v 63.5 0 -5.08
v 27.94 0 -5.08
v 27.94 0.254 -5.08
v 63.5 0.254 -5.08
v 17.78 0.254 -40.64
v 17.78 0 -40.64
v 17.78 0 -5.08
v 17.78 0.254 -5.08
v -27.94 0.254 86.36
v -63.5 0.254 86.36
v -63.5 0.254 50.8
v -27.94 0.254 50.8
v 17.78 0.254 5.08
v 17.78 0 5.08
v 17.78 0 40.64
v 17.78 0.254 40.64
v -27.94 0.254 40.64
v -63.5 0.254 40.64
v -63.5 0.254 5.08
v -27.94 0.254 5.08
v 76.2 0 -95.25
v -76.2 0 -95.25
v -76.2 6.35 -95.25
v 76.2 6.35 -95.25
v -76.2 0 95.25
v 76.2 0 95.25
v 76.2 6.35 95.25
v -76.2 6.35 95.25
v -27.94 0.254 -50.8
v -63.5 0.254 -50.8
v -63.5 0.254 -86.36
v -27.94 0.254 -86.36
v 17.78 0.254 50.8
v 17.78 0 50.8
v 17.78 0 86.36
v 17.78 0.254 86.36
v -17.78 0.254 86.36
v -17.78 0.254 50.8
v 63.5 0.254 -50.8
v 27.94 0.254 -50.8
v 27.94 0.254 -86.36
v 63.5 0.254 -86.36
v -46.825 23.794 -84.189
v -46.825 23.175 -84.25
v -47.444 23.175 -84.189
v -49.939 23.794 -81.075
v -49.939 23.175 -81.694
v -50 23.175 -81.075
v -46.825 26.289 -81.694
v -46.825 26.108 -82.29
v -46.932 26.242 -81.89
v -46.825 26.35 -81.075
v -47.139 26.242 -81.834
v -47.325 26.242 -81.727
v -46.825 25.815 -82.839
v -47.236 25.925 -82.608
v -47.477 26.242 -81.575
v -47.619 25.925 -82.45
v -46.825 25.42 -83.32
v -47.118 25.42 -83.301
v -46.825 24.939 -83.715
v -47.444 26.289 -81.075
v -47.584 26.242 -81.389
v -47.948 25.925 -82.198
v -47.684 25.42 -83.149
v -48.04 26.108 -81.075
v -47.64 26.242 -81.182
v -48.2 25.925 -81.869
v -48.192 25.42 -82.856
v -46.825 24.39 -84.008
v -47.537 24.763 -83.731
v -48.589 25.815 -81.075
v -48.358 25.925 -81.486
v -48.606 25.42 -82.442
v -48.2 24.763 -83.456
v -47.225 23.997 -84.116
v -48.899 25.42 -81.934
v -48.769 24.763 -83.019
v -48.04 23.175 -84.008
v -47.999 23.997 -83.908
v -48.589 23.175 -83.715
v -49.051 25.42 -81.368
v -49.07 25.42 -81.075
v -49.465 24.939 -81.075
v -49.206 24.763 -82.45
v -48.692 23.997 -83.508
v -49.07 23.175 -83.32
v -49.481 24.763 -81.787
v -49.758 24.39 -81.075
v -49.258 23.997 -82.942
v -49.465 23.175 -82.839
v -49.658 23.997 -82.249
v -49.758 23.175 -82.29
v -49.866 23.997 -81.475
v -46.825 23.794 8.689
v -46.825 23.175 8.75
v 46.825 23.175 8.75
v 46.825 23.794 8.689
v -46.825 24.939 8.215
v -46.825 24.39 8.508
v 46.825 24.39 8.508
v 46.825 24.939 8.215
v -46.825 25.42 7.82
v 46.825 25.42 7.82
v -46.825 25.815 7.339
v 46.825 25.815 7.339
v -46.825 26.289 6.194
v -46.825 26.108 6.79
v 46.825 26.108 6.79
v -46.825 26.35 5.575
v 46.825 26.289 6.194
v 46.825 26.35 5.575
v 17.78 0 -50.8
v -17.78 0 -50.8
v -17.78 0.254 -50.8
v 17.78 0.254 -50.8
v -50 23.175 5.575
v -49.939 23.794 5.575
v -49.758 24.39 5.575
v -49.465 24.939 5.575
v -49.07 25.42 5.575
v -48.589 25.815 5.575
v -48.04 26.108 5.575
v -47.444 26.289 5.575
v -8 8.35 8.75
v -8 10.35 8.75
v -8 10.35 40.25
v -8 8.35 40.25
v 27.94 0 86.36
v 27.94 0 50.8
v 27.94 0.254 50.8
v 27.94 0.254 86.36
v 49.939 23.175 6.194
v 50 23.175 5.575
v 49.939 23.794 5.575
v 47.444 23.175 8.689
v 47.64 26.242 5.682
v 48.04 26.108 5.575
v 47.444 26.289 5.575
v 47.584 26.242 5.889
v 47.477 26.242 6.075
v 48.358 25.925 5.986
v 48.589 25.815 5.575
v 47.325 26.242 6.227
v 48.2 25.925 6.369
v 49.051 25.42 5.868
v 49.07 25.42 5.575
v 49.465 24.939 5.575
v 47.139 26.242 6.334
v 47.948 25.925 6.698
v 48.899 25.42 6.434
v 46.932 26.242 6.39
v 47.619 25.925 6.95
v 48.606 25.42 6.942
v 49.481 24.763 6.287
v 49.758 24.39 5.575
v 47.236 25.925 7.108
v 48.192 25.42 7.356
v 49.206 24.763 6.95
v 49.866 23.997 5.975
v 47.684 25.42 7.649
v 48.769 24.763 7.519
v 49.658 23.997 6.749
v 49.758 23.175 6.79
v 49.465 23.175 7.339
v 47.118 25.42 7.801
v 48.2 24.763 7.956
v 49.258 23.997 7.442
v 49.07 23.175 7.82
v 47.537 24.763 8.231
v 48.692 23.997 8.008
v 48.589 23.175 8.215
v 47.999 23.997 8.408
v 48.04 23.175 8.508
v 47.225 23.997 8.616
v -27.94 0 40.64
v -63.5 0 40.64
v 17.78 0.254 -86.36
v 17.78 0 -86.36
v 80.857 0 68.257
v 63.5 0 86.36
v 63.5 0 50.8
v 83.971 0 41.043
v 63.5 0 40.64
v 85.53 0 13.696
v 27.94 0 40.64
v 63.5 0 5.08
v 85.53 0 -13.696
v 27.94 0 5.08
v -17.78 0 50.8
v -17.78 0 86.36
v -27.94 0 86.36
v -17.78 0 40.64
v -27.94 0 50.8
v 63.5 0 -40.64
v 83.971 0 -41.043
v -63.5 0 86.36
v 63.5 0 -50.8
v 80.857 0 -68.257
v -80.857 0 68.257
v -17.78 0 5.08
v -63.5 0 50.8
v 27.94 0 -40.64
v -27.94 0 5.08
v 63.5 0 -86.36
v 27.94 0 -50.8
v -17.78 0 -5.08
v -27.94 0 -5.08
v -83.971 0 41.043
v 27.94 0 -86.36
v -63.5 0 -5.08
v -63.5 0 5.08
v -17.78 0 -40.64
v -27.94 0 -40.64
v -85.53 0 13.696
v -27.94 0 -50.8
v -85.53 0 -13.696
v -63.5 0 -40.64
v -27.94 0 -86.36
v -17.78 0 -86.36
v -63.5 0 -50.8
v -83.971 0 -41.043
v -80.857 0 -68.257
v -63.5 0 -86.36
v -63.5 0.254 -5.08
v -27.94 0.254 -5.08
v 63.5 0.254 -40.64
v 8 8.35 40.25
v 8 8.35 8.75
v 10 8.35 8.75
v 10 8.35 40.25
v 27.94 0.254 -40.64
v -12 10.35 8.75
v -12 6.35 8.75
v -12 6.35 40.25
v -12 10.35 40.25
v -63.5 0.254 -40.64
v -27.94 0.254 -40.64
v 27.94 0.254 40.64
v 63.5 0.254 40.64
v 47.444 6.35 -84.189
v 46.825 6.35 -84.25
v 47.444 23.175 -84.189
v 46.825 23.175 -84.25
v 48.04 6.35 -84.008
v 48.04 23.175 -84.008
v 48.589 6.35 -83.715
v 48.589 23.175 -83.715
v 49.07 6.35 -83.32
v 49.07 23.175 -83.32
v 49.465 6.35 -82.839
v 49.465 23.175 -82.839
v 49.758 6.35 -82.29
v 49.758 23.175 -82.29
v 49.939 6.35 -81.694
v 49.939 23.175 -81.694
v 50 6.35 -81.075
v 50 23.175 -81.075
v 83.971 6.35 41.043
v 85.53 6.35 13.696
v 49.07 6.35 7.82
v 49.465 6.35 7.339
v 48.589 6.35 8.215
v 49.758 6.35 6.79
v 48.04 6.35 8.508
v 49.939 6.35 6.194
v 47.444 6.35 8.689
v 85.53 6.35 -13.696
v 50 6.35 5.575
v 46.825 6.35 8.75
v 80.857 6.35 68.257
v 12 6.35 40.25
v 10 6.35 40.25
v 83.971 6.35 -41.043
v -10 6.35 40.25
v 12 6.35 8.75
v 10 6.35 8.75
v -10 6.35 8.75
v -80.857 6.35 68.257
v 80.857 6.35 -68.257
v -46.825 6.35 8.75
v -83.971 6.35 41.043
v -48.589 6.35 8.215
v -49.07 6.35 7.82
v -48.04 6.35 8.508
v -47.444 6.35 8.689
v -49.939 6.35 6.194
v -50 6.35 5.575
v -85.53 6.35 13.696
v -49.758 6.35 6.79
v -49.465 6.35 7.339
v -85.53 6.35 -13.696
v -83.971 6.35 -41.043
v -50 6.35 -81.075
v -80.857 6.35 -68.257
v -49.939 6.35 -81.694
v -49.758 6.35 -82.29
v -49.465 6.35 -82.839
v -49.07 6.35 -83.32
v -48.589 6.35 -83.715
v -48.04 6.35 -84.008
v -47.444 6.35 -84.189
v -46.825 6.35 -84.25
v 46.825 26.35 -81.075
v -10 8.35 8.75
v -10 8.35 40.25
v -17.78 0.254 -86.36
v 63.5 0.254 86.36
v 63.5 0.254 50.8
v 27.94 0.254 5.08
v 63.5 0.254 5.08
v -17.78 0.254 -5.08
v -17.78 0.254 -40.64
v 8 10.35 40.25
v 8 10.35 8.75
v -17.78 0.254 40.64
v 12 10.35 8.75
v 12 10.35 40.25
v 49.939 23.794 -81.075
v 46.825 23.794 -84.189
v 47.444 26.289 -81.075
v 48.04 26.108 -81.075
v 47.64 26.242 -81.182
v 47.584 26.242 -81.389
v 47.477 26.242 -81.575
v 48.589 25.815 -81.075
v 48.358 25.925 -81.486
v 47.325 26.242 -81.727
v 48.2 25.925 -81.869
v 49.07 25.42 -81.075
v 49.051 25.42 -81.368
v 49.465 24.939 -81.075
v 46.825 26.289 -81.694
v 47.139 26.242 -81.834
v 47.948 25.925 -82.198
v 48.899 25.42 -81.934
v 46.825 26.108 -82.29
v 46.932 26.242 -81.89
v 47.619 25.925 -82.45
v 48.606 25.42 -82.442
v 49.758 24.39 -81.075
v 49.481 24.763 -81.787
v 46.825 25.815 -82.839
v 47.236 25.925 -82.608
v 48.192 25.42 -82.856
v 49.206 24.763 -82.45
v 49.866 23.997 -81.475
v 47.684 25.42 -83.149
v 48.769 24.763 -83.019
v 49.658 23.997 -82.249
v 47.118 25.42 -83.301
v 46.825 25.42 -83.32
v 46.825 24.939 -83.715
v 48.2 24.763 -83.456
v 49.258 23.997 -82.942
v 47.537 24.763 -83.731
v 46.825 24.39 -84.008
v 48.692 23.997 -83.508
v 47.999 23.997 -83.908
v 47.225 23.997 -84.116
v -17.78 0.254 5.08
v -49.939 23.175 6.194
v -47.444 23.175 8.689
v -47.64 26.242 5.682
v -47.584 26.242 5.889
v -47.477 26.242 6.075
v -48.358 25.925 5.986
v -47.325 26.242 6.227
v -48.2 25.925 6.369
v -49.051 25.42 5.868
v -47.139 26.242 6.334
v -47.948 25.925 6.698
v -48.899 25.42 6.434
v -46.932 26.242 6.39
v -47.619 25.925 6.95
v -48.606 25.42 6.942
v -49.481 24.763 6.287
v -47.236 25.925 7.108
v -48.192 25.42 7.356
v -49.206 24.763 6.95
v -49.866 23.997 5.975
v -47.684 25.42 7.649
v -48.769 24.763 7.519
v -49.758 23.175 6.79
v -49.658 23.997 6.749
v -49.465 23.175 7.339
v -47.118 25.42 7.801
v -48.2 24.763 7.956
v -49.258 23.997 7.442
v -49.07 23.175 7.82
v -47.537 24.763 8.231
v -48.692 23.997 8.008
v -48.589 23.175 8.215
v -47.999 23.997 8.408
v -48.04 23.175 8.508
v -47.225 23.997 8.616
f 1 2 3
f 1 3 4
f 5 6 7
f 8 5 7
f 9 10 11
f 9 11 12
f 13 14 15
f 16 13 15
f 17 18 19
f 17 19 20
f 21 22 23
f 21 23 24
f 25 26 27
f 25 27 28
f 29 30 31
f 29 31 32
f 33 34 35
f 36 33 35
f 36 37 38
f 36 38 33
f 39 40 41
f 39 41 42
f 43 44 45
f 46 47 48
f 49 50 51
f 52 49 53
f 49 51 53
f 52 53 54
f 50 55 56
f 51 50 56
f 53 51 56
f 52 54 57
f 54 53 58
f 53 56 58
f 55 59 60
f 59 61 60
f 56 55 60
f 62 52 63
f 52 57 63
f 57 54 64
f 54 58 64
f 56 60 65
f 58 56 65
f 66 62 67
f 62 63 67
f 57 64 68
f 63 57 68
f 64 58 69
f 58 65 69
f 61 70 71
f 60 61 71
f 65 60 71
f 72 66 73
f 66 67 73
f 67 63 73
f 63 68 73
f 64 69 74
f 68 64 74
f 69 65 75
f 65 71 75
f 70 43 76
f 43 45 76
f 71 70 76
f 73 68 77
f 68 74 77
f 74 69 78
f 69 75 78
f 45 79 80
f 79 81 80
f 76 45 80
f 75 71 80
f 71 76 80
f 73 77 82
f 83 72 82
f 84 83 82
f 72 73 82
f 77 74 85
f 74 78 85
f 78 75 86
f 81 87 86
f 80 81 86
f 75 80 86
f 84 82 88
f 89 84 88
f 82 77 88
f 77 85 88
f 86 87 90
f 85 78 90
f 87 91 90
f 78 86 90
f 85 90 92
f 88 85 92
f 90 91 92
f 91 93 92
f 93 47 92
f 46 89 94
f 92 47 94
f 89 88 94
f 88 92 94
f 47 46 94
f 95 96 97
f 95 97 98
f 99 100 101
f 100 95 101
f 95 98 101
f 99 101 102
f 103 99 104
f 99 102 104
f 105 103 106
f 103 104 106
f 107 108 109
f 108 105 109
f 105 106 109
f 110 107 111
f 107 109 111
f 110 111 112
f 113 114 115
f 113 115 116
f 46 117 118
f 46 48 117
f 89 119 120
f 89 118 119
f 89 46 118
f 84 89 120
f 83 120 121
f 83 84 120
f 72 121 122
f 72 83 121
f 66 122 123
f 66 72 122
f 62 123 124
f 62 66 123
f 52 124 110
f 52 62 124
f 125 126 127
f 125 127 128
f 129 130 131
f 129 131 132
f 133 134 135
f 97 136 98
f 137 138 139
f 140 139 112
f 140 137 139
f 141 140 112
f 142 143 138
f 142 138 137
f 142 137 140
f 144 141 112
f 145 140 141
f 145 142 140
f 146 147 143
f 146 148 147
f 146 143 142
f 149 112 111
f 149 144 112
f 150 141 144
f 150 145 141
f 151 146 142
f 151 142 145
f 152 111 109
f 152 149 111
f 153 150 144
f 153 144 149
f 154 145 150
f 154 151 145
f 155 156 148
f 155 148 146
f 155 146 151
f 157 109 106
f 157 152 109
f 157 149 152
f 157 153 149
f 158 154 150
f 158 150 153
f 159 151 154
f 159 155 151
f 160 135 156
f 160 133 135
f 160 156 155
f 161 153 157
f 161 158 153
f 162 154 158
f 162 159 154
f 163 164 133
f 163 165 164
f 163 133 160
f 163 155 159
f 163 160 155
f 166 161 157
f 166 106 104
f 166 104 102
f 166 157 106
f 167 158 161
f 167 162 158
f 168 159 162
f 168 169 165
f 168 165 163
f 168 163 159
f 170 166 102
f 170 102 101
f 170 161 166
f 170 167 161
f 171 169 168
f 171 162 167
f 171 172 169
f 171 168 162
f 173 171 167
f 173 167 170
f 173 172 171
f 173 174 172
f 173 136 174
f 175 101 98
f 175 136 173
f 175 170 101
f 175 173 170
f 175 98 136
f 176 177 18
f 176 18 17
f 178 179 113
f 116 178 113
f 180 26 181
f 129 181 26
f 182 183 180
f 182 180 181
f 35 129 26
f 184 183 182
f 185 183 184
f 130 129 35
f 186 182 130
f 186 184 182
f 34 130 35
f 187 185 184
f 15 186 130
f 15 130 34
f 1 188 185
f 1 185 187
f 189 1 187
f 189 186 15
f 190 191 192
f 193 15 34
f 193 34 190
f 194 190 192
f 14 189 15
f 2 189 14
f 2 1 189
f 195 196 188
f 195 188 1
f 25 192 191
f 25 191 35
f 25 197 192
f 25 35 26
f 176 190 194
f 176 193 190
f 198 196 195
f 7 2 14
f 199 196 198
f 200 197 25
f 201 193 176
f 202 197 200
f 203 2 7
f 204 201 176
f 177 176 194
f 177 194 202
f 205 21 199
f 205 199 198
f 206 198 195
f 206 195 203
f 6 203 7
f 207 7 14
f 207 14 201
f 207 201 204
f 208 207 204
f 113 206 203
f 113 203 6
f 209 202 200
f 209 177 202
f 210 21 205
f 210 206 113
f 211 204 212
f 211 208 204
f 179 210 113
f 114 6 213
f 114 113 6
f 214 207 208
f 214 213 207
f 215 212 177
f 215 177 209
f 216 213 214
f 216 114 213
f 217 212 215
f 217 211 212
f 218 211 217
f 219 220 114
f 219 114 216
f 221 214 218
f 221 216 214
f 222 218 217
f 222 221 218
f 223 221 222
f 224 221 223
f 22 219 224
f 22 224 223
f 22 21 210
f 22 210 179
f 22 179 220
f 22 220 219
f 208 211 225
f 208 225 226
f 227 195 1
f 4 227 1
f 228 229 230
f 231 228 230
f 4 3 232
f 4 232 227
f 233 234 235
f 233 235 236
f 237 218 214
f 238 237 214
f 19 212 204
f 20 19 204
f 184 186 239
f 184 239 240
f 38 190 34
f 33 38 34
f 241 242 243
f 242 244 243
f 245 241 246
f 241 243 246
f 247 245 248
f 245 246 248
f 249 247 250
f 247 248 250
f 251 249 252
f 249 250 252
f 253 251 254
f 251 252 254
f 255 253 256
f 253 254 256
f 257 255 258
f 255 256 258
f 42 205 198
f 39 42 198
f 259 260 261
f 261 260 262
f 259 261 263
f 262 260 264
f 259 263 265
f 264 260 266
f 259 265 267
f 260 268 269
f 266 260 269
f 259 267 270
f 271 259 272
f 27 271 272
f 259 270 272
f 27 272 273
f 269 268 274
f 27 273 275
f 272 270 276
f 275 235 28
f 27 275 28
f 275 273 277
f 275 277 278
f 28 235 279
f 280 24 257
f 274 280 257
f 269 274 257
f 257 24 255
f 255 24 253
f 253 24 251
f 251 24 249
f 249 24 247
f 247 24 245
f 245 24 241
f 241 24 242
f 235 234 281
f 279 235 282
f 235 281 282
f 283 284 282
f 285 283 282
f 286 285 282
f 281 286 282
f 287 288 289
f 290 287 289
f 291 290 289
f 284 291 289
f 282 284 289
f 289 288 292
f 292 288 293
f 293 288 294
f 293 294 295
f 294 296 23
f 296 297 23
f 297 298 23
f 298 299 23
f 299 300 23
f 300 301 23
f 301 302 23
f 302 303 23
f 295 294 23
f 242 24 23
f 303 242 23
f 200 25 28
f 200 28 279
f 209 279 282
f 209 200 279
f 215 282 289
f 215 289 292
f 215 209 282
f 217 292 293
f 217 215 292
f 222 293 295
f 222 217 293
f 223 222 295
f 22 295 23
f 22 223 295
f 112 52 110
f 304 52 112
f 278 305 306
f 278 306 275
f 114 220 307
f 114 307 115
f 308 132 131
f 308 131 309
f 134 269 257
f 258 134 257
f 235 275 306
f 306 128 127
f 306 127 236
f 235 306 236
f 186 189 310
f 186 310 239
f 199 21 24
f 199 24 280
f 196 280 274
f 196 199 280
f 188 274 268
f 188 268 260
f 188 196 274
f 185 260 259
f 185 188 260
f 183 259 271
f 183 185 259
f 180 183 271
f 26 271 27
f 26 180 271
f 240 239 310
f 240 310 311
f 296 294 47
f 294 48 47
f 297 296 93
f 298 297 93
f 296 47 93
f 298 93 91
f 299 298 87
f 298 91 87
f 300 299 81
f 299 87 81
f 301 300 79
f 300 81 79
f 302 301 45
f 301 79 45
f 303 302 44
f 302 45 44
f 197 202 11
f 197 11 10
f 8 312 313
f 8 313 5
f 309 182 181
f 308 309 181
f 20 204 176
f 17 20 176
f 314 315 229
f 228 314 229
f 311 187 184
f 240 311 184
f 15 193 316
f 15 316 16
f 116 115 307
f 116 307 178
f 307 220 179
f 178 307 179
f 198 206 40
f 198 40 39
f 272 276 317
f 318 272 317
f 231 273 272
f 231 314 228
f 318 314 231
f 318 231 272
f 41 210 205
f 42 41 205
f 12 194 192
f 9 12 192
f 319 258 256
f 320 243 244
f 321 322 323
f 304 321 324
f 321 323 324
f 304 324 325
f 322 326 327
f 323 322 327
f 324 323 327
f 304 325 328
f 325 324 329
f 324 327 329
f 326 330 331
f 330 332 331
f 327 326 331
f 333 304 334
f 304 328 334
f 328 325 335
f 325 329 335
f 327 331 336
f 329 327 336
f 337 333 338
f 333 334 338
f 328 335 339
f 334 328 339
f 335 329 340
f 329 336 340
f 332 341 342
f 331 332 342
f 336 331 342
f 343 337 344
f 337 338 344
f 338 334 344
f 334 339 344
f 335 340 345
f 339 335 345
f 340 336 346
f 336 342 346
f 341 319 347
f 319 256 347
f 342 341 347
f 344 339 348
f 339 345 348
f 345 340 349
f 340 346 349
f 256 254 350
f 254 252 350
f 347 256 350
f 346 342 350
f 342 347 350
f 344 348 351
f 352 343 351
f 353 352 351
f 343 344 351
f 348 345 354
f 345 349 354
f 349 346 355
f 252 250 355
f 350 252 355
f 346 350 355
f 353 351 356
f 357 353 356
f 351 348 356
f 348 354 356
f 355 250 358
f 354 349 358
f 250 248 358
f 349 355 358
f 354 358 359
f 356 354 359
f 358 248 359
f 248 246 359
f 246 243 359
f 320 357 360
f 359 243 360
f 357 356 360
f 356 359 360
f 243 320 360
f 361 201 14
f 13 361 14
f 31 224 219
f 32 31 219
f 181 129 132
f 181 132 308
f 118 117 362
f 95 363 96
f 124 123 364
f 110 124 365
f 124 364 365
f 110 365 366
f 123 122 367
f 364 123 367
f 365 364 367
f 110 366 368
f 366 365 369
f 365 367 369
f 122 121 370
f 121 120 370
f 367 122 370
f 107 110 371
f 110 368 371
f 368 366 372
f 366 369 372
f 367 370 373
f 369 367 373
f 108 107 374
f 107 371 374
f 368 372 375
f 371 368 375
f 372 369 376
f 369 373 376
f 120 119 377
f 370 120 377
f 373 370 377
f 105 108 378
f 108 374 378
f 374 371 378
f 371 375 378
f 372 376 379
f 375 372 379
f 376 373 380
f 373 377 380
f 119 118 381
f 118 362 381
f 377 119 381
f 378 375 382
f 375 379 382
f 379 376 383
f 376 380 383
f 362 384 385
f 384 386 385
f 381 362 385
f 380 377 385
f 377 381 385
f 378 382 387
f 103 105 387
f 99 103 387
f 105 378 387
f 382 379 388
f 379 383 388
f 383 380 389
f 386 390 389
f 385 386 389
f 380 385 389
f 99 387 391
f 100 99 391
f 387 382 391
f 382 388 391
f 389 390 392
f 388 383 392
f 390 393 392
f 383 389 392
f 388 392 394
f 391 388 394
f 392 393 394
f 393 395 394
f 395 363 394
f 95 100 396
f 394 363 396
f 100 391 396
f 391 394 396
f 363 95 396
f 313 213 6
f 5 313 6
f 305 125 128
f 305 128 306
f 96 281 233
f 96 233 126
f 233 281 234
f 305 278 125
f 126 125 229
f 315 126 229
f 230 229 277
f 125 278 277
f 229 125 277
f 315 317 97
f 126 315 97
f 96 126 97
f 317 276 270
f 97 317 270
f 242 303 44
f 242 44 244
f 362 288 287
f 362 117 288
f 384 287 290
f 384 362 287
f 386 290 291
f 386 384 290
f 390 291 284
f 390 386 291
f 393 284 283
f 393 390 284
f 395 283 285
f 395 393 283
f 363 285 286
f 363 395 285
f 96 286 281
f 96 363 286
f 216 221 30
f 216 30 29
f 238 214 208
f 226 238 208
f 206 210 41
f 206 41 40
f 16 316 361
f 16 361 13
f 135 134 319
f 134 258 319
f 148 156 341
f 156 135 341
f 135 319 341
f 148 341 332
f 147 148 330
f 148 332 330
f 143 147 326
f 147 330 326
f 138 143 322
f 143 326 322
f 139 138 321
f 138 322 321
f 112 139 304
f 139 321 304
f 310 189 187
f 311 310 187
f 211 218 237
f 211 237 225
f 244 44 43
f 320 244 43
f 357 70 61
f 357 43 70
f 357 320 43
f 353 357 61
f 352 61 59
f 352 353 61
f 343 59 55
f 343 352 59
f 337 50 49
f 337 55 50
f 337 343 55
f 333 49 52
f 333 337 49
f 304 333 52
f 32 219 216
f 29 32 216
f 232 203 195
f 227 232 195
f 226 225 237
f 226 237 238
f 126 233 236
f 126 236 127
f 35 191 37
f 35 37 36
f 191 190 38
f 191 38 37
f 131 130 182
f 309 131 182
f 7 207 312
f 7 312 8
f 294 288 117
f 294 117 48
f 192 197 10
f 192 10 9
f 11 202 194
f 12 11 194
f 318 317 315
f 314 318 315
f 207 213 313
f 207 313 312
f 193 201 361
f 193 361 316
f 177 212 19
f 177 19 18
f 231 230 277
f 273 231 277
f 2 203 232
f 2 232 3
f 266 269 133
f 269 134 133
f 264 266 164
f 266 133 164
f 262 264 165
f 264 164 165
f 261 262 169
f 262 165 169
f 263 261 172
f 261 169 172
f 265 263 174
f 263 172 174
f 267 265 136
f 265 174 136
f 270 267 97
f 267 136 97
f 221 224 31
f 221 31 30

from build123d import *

# Parameters (mm, degrees)
BOSS_EXTRUDE1_DEPTH = 6.35
SKETCH2_W           = 100
SKETCH2_H           = 93
BOSS_EXTRUDE2_DEPTH = 20
FILLET1_R           = 3.175
BOSS_EXTRUDE3_DEPTH = 31.5
SKETCH5_W           = 35.56
SKETCH5_H           = 35.56
CUT_EXTRUDE1_DEPTH  = 0.254
LPATTERN1_COUNT     = 3
LPATTERN1_PITCH     = 45.72
LPATTERN2_COUNT     = 2
LPATTERN2_PITCH     = 45.72


with BuildPart() as part:
    # Sketch1 → Boss-Extrude1 (new body)
    with BuildSketch(Plane(origin=(0, 0, 0), x_dir=(1, 0, 0), z_dir=(0, 1, 0))):
        with BuildLine():
            Line((-76.2, 95.25), (76.2, 95.25))
            ThreePointArc((76.2, 95.25), (85.725, 0), (76.2, -95.25))
            Line((76.2, -95.25), (-76.2, -95.25))
            ThreePointArc((-76.2, -95.25), (-85.725, 0), (-76.2, 95.25))
        make_face()
    extrude(amount=BOSS_EXTRUDE1_DEPTH)

    # Sketch2 → Boss-Extrude2 (add)
    with BuildSketch(Plane(origin=(0, 6.35, 0), x_dir=(1, 0, 0), z_dir=(0, 1, 0))):
        with Locations((0, 37.75)):
            Rectangle(SKETCH2_W, SKETCH2_H)
    extrude(amount=BOSS_EXTRUDE2_DEPTH)

    # Fillet1
    fillet1_edges = [part.edges().sort_by_distance(p)[0] for p in [
        (50, 16.35, 8.75),
        (50, 16.35, -84.25),
        (-50, 16.35, -84.25),
        (-50, 16.35, 8.75),
        (50, 26.35, -37.75),
        (0, 26.35, -84.25),
        (-50, 26.35, -37.75),
        (0, 26.35, 8.75),
    ]]
    fillet(fillet1_edges, radius=FILLET1_R)

    # Sketch3 → Boss-Extrude3 (add)
    with BuildSketch(Plane.XY.offset(8.75)):
        Polygon((-12, 6.35), (-12, 10.35), (-8, 10.35), (-8, 8.35), (-10, 8.35), (-10, 6.35), align=None)
        Polygon((10, 6.35), (12, 6.35), (12, 10.35), (8, 10.35), (8, 8.35), (10, 8.35), align=None)
    extrude(amount=BOSS_EXTRUDE3_DEPTH)

    # Sketch5 → Cut-Extrude1 (cut)
    with BuildSketch(Plane.XZ):
        with Locations((-45.72, -22.86)):
            Rectangle(SKETCH5_W, SKETCH5_H)
        with Locations((0, -22.86)):
            Rectangle(SKETCH5_W, SKETCH5_H)
        with Locations((45.72, -22.86)):
            Rectangle(SKETCH5_W, SKETCH5_H)
    cut_extrude1 = extrude(amount=-CUT_EXTRUDE1_DEPTH, mode=Mode.SUBTRACT)

    # LPattern1: Cut-Extrude1 ×3
    with Locations(*[(0, 0, i * LPATTERN1_PITCH) for i in range(1, LPATTERN1_COUNT)]):
        add(cut_extrude1, mode=Mode.SUBTRACT)

    # LPattern2: Cut-Extrude1 ×2
    with Locations(*[(0, 0, -i * LPATTERN2_PITCH) for i in range(1, LPATTERN2_COUNT)]):
        add(cut_extrude1, mode=Mode.SUBTRACT)


solid = part.part
